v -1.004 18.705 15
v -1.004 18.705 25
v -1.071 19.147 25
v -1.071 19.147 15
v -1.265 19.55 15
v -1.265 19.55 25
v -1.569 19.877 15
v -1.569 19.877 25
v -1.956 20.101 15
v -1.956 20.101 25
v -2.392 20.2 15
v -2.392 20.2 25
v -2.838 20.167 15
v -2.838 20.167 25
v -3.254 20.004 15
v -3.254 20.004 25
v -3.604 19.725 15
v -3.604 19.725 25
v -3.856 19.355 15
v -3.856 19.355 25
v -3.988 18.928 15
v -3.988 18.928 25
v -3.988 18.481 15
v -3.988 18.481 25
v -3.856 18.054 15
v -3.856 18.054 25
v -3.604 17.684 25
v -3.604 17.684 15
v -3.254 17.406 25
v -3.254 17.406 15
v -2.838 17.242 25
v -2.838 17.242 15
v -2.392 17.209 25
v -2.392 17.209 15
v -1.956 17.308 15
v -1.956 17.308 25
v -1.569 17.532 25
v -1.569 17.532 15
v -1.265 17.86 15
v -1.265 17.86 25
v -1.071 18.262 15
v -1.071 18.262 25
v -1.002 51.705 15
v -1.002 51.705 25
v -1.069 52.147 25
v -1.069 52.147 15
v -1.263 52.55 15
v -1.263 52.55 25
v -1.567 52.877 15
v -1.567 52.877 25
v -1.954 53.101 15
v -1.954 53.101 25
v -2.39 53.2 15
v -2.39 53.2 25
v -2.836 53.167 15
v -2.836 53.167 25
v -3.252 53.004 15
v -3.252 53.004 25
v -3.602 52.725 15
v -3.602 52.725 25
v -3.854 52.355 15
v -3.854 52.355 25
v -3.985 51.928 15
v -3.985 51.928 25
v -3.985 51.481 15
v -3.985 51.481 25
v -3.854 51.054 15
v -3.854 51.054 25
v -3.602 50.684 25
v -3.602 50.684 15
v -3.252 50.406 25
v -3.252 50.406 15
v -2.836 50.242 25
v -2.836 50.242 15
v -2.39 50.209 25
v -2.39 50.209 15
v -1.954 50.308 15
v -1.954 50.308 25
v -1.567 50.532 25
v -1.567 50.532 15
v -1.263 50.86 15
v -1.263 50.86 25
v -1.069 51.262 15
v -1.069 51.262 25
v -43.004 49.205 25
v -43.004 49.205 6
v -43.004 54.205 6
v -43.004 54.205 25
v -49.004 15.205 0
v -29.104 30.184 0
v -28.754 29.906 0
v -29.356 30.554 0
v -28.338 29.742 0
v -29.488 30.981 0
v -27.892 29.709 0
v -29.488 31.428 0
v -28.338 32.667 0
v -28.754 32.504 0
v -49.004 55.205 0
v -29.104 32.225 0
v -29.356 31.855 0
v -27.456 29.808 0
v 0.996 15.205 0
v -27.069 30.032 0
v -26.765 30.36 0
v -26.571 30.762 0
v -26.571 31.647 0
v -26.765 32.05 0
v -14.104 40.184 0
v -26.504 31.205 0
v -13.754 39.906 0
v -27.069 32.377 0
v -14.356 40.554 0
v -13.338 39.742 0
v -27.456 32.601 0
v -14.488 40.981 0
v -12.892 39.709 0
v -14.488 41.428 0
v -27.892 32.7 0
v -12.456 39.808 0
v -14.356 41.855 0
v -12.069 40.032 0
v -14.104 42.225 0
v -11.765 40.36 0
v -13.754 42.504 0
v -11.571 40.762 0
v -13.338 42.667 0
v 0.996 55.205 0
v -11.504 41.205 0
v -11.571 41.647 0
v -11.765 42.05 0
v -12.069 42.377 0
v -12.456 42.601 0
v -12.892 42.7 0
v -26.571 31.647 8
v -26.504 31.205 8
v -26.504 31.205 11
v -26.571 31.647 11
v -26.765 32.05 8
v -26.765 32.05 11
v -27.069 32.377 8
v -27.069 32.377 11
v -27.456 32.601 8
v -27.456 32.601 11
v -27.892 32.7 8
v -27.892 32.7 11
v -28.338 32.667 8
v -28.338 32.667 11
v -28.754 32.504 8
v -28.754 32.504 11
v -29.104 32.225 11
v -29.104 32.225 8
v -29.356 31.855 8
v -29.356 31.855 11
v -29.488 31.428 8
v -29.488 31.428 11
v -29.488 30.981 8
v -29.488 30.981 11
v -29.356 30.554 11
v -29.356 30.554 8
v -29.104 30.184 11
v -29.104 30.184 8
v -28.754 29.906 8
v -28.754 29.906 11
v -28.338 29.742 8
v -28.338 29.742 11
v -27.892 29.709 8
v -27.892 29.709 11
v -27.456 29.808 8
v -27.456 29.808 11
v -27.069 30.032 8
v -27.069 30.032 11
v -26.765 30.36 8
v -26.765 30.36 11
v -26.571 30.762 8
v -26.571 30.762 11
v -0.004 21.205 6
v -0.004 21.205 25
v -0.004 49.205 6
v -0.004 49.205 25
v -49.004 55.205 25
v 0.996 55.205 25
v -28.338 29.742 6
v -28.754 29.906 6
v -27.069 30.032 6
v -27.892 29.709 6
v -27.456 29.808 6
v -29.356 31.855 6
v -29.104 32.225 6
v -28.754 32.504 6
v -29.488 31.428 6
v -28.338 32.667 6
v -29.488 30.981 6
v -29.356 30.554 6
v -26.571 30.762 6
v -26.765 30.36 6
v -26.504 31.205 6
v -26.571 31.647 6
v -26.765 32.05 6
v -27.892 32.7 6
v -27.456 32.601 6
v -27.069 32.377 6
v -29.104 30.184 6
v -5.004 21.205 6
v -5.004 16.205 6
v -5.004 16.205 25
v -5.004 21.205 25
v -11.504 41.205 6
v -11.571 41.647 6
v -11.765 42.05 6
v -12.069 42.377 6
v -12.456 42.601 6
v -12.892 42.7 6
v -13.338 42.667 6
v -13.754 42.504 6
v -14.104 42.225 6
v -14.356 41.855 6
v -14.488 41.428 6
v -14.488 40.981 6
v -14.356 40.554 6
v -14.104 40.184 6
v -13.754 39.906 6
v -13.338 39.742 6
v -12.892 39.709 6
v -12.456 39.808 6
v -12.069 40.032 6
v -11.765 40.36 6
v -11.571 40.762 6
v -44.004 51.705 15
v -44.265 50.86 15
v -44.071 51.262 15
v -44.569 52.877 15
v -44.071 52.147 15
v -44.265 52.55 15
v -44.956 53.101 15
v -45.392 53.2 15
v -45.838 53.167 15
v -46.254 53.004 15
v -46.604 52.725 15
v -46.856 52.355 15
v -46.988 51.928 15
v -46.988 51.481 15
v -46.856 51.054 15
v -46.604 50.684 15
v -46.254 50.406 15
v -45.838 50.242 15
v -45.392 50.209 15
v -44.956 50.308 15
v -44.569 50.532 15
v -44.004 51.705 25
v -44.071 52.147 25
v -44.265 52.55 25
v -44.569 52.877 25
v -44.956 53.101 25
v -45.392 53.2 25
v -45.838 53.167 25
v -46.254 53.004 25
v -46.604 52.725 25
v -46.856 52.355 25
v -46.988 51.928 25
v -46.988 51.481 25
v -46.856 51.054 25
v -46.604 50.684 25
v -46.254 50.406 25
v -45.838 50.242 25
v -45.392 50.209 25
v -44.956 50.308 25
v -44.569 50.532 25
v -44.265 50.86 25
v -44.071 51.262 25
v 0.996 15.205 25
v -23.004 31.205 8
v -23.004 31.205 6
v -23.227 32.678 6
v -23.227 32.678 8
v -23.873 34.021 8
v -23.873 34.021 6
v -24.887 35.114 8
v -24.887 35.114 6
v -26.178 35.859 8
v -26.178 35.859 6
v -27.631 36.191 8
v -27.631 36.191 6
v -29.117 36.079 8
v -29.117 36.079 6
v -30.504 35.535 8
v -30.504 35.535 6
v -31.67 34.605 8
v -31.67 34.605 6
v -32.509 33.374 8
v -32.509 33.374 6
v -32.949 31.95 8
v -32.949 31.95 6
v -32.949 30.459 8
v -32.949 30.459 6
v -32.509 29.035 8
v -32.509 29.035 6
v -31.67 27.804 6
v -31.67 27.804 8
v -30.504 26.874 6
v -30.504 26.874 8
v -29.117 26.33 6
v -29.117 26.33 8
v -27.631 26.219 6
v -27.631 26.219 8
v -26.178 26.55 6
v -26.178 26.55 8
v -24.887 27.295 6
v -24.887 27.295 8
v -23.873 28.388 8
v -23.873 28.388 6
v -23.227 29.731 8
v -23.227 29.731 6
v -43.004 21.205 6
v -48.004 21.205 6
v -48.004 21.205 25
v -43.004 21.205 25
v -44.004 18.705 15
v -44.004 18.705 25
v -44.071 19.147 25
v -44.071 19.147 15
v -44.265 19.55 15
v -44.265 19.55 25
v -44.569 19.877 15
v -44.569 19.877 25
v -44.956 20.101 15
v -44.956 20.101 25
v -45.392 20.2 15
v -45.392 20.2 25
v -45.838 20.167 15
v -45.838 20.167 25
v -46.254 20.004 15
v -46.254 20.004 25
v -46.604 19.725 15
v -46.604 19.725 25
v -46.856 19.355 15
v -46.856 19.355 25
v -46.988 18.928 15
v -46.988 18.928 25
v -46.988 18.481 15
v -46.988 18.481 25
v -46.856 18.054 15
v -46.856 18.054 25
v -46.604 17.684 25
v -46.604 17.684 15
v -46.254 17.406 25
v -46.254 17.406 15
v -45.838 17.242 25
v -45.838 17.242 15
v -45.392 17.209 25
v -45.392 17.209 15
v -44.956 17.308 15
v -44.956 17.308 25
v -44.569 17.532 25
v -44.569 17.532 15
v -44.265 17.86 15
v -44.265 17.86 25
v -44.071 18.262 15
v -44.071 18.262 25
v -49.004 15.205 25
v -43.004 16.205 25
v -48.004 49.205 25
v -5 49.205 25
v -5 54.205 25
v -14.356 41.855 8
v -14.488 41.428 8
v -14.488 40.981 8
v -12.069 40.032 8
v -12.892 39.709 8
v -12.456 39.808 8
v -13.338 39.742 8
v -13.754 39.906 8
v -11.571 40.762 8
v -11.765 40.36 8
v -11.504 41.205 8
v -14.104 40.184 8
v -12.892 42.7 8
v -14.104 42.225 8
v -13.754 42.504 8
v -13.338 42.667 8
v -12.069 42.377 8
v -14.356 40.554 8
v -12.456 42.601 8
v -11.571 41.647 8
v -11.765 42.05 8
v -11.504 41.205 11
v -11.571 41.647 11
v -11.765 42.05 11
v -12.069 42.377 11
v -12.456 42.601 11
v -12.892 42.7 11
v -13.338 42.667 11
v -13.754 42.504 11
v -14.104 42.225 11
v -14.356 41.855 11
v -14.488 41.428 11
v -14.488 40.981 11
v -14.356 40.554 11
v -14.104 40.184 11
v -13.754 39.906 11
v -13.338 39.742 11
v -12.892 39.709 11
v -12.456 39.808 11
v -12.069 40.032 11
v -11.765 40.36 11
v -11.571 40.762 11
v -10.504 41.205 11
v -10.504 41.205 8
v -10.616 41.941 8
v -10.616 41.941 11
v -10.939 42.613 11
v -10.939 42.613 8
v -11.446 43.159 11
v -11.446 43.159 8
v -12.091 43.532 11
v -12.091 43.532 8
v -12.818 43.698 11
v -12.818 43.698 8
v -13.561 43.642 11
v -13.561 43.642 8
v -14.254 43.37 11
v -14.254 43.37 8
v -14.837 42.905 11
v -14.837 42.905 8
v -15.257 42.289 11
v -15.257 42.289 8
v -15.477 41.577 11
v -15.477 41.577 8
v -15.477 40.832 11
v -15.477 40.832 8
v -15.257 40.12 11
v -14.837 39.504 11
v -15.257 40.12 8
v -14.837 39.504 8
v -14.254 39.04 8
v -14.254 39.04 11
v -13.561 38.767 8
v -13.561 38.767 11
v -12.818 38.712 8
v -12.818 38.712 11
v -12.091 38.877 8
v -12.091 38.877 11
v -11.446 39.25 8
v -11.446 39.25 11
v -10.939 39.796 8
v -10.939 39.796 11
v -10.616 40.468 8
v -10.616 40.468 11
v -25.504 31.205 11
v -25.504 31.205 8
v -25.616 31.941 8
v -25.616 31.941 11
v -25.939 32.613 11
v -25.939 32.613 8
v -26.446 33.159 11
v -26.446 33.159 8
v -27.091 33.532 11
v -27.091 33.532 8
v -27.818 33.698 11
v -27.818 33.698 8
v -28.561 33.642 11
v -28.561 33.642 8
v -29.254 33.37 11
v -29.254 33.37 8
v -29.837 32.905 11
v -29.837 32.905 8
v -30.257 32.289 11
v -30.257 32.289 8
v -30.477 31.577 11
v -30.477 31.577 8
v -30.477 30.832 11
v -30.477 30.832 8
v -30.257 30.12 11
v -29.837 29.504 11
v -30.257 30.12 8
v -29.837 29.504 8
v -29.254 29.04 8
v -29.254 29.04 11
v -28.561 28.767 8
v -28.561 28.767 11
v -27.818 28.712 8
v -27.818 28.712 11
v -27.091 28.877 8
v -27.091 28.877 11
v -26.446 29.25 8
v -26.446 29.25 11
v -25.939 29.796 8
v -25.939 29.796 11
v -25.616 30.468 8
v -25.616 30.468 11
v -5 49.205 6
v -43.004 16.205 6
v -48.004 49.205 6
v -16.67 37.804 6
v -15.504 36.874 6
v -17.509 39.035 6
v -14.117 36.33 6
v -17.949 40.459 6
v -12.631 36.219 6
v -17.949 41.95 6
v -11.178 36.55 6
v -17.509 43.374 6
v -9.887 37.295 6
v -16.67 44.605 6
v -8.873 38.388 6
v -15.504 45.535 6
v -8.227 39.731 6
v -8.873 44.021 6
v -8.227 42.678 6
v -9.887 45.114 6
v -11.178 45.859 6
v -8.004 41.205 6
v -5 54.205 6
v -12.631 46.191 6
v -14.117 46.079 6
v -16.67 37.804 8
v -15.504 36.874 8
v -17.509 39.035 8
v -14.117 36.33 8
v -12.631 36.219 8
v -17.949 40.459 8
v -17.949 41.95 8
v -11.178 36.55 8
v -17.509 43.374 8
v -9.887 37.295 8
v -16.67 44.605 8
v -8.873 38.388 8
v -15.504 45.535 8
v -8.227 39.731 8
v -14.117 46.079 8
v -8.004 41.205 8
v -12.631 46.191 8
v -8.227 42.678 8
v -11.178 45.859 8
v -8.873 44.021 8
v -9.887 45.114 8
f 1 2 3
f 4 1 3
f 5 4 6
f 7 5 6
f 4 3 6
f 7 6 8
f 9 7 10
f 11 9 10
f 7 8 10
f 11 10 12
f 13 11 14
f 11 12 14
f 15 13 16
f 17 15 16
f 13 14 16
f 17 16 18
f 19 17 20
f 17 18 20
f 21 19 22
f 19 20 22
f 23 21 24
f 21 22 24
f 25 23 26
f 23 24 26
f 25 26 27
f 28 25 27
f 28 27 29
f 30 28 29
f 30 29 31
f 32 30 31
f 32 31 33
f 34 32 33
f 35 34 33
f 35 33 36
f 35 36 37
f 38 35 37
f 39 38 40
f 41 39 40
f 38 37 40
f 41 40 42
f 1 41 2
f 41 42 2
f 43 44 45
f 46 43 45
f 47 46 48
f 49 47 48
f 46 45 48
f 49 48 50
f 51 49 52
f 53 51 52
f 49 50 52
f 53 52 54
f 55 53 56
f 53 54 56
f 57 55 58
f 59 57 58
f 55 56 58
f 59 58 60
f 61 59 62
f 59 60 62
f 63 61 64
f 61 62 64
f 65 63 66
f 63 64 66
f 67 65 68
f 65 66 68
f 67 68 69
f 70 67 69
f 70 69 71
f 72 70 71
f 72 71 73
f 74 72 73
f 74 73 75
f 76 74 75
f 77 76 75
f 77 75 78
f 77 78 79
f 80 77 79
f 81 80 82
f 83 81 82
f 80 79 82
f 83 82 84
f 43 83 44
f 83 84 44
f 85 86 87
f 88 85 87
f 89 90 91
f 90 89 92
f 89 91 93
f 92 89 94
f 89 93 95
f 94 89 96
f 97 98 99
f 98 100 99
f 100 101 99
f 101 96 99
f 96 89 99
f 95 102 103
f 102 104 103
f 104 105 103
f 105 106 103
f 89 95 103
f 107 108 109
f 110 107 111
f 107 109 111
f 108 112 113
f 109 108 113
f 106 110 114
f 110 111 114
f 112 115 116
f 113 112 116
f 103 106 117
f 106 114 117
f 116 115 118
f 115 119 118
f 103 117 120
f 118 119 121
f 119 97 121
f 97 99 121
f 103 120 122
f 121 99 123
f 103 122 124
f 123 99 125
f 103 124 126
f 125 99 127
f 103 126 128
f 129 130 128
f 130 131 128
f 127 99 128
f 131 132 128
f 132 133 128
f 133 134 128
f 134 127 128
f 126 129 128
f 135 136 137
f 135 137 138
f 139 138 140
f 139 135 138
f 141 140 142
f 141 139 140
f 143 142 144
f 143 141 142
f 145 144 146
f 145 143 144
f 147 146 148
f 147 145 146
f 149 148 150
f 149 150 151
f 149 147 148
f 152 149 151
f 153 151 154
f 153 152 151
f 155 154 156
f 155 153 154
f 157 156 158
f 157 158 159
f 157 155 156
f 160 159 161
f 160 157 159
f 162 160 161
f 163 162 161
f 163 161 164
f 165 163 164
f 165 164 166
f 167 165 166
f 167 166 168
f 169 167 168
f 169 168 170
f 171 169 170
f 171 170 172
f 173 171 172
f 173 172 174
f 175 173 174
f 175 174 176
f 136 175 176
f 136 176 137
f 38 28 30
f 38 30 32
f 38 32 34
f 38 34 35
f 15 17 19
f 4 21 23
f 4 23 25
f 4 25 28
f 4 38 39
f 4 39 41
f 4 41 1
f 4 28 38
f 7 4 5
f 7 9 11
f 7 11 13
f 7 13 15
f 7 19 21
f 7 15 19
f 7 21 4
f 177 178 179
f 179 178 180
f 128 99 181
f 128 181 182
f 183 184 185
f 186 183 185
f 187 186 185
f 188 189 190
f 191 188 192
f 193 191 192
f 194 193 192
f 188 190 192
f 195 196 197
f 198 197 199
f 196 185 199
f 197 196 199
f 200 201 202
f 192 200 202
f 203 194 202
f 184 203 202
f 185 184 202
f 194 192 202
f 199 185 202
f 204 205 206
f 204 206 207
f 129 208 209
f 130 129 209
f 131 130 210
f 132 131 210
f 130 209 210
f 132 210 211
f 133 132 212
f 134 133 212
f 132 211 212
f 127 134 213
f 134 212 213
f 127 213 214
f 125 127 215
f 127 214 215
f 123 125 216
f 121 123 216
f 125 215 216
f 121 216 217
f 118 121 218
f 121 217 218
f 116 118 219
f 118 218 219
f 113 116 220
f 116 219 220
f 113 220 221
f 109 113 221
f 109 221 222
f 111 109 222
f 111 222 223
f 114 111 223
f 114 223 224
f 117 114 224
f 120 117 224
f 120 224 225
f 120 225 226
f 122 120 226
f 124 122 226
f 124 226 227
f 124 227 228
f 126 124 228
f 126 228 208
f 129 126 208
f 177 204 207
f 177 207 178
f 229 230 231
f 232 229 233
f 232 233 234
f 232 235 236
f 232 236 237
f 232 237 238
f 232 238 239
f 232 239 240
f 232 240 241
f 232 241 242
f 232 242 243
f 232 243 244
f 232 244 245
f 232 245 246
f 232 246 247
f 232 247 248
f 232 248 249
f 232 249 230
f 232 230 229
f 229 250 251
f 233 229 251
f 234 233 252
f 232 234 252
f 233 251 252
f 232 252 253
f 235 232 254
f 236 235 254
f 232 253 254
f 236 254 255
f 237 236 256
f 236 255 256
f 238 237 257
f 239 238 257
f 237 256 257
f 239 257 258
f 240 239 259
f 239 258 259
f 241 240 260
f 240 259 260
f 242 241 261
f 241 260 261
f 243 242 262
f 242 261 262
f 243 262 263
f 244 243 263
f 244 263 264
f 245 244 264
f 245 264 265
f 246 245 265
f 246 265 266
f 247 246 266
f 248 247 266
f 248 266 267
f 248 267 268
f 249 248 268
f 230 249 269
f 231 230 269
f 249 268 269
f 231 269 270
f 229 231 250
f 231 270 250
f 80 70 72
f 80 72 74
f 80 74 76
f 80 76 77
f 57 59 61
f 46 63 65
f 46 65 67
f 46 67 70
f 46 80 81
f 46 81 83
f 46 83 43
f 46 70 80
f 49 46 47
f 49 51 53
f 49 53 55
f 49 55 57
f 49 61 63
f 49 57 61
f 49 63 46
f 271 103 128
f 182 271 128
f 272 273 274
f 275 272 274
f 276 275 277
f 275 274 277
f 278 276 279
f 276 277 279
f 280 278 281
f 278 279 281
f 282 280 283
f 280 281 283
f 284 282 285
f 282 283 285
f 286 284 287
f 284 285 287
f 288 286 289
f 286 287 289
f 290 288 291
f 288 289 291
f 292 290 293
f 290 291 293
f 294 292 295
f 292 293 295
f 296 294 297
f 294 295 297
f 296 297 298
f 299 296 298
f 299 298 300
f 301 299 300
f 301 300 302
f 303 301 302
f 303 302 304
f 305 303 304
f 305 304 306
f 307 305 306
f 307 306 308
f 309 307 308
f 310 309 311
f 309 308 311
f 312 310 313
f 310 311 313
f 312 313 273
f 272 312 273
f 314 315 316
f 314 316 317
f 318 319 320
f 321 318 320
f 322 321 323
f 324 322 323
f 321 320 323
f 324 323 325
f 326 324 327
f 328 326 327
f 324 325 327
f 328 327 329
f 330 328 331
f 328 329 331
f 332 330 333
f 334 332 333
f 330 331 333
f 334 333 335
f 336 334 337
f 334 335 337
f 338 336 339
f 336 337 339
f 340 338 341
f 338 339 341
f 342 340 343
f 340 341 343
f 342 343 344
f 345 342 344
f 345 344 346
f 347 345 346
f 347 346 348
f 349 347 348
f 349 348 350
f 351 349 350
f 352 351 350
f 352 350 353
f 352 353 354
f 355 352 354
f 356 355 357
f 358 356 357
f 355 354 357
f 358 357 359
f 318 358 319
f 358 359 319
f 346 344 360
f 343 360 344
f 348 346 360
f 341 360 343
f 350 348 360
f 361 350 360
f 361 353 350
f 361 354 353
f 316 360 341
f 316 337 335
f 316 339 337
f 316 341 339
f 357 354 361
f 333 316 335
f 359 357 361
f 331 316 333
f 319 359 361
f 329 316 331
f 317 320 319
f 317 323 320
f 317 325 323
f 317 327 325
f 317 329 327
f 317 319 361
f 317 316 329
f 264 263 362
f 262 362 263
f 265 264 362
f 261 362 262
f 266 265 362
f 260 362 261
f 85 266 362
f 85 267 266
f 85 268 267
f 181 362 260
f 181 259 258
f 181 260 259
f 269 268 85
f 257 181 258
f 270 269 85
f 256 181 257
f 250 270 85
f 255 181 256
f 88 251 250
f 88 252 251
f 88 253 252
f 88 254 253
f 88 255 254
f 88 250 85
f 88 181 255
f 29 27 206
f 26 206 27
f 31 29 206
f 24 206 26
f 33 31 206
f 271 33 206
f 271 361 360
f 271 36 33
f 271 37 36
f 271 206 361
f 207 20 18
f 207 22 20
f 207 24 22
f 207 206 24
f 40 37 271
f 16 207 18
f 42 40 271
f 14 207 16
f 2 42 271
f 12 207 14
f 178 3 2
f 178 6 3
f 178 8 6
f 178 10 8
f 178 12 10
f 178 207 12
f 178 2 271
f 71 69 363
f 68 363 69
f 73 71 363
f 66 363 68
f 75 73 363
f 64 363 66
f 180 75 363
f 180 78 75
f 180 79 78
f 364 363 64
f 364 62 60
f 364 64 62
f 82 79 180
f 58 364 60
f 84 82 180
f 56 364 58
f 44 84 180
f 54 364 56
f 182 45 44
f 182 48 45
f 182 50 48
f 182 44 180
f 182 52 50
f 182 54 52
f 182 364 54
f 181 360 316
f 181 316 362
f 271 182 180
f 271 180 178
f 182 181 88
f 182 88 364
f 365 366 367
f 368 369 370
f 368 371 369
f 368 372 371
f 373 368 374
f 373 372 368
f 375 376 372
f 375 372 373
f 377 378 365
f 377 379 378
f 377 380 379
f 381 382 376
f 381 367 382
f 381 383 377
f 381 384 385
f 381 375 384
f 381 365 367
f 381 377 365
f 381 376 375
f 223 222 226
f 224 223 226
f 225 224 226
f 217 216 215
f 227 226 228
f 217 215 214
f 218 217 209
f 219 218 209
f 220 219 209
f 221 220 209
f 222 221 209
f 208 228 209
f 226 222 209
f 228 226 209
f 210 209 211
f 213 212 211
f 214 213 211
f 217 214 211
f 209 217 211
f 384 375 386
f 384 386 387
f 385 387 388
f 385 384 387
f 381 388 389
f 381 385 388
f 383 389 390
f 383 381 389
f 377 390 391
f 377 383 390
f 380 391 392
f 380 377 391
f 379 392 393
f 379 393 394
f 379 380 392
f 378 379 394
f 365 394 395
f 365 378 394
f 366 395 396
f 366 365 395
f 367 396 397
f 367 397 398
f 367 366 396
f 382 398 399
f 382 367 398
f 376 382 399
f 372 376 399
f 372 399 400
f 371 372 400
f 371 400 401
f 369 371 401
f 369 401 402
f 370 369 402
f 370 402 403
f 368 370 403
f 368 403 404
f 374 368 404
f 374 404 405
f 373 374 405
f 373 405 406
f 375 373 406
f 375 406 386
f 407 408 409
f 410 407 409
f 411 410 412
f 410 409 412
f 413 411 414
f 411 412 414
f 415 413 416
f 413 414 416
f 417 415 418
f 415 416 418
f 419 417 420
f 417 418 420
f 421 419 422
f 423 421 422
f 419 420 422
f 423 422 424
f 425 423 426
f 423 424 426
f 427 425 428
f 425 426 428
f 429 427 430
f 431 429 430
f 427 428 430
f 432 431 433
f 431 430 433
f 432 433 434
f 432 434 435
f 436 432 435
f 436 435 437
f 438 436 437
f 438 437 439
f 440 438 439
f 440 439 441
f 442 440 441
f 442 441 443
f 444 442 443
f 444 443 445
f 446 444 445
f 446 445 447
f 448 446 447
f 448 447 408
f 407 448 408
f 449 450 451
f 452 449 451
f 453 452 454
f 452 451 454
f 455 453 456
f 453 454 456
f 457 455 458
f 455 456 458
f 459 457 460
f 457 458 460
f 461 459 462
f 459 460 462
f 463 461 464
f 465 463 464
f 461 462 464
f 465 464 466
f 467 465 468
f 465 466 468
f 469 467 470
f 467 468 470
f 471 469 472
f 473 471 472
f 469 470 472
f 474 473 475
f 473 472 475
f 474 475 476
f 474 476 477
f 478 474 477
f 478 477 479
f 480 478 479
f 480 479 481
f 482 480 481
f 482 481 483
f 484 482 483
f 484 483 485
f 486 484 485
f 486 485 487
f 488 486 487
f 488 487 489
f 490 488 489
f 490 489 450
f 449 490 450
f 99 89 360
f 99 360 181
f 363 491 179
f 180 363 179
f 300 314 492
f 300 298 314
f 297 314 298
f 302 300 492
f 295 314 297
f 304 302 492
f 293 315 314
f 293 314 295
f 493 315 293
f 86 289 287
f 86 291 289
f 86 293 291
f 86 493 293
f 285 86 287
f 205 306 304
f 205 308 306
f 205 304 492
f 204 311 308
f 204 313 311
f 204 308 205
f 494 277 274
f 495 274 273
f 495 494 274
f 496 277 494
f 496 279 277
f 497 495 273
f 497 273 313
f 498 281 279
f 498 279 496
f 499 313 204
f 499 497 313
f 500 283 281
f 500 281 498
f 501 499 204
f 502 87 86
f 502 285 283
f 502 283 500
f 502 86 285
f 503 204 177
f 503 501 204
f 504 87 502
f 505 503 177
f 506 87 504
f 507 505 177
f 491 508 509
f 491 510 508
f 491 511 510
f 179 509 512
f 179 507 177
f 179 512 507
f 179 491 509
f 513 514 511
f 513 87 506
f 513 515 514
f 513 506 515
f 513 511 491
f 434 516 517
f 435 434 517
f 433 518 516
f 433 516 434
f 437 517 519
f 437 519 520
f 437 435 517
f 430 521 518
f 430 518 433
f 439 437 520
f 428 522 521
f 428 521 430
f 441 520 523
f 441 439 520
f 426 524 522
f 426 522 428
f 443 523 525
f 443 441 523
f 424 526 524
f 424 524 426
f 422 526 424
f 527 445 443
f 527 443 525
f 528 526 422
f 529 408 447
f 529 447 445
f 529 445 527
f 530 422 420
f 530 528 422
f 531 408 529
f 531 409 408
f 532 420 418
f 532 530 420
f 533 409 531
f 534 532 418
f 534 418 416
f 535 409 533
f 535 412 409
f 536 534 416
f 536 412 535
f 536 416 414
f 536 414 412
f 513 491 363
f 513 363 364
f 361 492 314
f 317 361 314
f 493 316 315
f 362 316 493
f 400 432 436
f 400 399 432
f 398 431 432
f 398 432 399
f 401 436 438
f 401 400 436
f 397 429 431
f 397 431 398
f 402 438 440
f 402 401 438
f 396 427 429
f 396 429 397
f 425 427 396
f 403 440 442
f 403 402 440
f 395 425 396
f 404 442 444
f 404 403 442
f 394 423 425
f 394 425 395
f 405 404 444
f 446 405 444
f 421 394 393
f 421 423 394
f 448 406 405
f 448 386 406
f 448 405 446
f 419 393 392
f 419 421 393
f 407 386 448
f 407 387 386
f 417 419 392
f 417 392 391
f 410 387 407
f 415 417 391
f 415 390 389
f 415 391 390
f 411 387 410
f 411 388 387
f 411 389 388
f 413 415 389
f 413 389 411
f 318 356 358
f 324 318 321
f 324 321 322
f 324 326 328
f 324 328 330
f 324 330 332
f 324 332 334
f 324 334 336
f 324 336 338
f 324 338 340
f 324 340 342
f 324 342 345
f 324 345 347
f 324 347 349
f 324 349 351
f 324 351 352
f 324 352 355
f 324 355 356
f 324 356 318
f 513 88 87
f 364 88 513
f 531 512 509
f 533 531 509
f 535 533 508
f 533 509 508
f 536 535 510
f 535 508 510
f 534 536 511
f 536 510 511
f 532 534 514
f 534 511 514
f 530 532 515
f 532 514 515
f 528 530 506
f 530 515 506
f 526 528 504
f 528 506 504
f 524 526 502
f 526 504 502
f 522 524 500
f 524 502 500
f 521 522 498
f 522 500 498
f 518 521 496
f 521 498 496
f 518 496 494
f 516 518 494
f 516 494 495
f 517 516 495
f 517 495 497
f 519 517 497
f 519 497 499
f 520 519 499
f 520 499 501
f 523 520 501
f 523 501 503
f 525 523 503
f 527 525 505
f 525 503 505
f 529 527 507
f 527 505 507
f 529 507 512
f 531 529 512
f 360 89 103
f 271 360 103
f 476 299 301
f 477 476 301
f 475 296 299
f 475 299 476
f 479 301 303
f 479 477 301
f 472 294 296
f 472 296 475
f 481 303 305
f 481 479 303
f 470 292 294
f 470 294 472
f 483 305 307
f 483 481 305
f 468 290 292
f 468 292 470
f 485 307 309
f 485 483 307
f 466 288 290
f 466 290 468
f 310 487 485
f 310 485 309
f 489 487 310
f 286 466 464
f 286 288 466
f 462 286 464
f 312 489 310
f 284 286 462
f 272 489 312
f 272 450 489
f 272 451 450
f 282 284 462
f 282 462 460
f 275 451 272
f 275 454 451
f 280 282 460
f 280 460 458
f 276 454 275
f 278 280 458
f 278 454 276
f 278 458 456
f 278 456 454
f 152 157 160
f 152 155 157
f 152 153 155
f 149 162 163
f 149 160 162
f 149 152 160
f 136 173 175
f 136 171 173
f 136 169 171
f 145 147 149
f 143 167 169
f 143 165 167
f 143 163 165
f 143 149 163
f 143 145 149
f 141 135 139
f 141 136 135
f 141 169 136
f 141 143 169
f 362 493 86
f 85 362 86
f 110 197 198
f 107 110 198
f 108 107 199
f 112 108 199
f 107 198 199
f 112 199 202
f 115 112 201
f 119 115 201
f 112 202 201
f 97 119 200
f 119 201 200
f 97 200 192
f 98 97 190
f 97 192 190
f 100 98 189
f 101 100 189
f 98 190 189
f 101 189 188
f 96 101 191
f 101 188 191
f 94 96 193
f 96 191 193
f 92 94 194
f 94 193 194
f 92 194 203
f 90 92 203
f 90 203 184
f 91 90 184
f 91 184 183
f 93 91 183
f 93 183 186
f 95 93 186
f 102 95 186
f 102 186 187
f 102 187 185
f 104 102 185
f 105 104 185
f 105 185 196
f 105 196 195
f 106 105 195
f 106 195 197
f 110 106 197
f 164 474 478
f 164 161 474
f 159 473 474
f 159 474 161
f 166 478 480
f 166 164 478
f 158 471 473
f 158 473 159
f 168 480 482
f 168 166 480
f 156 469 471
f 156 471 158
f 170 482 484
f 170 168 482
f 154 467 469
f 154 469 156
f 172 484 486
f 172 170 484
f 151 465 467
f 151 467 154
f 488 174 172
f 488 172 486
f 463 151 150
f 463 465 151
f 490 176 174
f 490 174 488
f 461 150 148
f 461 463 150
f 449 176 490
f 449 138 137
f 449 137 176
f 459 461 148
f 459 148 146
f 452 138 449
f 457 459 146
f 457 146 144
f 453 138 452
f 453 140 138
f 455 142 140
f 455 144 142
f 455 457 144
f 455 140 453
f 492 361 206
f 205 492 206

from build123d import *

# Parameters (mm, degrees)
F0_W      = 50
F0_H      = 40
F1_DEPTH  = 25
F2_W      = 48
F2_H      = 38
F3_DEPTH  = 19
F4_W      = 5
F4_H      = 5
F4_W_2    = 4.9955489208
F5_DEPTH  = 19
F6_R      = 1.5
F7_DEPTH  = 10
F8_R      = 2.5
F8_R_2    = 1.5
F9_DEPTH  = 5
F10_DEPTH = 10
F11_R     = 5
F12_DEPTH = 2
F13_R     = 1.5
F14_DEPTH = 5


with BuildPart() as f1:
    # F0 (on Top) → F1 (new body)
    with BuildSketch(Plane.XY):
        with Locations((-24.0044510792, 35.204609856)):
            Rectangle(F0_W, F0_H)
    extrude(amount=F1_DEPTH)

    # F2 (on face) → F3 (cut)
    with BuildSketch(Plane.XY.offset(25)):
        with Locations((-24.0044510792, 35.204609856)):
            Rectangle(F2_W, F2_H)
    extrude(amount=-F3_DEPTH, mode=Mode.SUBTRACT)

    # F4 (on face) → F5 (join)
    with BuildSketch(Plane.XY.offset(6)):
        with Locations((-45.5044510792, 51.704609856)):
            Rectangle(F4_W, F4_H)
        with Locations((-45.5044510792, 18.704609856)):
            Rectangle(F4_W, F4_H)
        with Locations((-2.5022255396, 51.704609856)):
            Rectangle(F4_W_2, F4_H)
        with Locations((-2.5044510792, 18.704609856)):
            Rectangle(F4_W, F4_H)
    extrude(amount=F5_DEPTH)

    # F6 (on face) → F7 (cut)
    with BuildSketch(Plane.XY.offset(25)):
        with Locations((-45.5044510792, 51.704609856)):
            Circle(F6_R)
        with Locations((-45.5044510792, 18.704609856)):
            Circle(F6_R)
        with Locations((-2.5044510792, 18.704609856)):
            Circle(F6_R)
        with Locations((-2.5022255396, 51.704609856)):
            Circle(F6_R)
    extrude(amount=-F7_DEPTH, mode=Mode.SUBTRACT)

    # F8 (on face) → F9 (join)
    with BuildSketch(Plane.XY.offset(6)):
        with Locations((-28.0044510792, 31.204609856)):
            Circle(F8_R)
        with Locations((-28.0044510792, 31.204609856)):
            Circle(F8_R_2, mode=Mode.SUBTRACT)
        with Locations((-13.0044510792, 41.204609856)):
            Circle(F8_R)
        with Locations((-13.0044510792, 41.204609856)):
            Circle(F8_R_2, mode=Mode.SUBTRACT)
    extrude(amount=F9_DEPTH)

    # F10 (cut): faces of the model
    f10_faces = [f1.faces().sort_by_distance(p)[0] for p in [
        (-28.0044510792, 31.204609856, 6),
        (-13.0044510792, 41.204609856, 6),
    ]]
    extrude(f10_faces, amount=-F10_DEPTH, mode=Mode.SUBTRACT)

    # F11 (on face) → F12 (join)
    with BuildSketch(Plane.XY.offset(6)):
        with Locations((-28.0044510792, 31.204609856)):
            Circle(F11_R)
        with Locations((-13.0044510792, 41.204609856)):
            Circle(F11_R)
    extrude(amount=F12_DEPTH)

    # F13 (on face) → F14 (cut)
    with BuildSketch(Plane(origin=(0, 0, 0), x_dir=(1, 0, 0), z_dir=(0, 0, -1))):
        Polygon((-25.0050230309, -31.2631878667), (-26.4540070097, -28.6363179747), (-29.453435058, -28.5777399641), (-31.0038791275, -31.1460318454), (-29.5548951487, -33.7729017373), (-26.5554671004, -33.8314797479), align=None)
        with Locations((-28.0044510792, -31.204609856)):
            Circle(F13_R, mode=Mode.SUBTRACT)
        Polygon((-10.2501344474, -42.3936178003), (-10.5975816782, -39.4138056549), (-13.3518983101, -38.2247977106), (-15.758767711, -40.0156019117), (-15.4113204802, -42.9954140571), (-12.6570038483, -44.1844220014), align=None)
        with Locations((-13.0044510792, -41.204609856)):
            Circle(F13_R, mode=Mode.SUBTRACT)
    extrude(amount=F14_DEPTH, mode=Mode.SUBTRACT)


solid = f1.part
